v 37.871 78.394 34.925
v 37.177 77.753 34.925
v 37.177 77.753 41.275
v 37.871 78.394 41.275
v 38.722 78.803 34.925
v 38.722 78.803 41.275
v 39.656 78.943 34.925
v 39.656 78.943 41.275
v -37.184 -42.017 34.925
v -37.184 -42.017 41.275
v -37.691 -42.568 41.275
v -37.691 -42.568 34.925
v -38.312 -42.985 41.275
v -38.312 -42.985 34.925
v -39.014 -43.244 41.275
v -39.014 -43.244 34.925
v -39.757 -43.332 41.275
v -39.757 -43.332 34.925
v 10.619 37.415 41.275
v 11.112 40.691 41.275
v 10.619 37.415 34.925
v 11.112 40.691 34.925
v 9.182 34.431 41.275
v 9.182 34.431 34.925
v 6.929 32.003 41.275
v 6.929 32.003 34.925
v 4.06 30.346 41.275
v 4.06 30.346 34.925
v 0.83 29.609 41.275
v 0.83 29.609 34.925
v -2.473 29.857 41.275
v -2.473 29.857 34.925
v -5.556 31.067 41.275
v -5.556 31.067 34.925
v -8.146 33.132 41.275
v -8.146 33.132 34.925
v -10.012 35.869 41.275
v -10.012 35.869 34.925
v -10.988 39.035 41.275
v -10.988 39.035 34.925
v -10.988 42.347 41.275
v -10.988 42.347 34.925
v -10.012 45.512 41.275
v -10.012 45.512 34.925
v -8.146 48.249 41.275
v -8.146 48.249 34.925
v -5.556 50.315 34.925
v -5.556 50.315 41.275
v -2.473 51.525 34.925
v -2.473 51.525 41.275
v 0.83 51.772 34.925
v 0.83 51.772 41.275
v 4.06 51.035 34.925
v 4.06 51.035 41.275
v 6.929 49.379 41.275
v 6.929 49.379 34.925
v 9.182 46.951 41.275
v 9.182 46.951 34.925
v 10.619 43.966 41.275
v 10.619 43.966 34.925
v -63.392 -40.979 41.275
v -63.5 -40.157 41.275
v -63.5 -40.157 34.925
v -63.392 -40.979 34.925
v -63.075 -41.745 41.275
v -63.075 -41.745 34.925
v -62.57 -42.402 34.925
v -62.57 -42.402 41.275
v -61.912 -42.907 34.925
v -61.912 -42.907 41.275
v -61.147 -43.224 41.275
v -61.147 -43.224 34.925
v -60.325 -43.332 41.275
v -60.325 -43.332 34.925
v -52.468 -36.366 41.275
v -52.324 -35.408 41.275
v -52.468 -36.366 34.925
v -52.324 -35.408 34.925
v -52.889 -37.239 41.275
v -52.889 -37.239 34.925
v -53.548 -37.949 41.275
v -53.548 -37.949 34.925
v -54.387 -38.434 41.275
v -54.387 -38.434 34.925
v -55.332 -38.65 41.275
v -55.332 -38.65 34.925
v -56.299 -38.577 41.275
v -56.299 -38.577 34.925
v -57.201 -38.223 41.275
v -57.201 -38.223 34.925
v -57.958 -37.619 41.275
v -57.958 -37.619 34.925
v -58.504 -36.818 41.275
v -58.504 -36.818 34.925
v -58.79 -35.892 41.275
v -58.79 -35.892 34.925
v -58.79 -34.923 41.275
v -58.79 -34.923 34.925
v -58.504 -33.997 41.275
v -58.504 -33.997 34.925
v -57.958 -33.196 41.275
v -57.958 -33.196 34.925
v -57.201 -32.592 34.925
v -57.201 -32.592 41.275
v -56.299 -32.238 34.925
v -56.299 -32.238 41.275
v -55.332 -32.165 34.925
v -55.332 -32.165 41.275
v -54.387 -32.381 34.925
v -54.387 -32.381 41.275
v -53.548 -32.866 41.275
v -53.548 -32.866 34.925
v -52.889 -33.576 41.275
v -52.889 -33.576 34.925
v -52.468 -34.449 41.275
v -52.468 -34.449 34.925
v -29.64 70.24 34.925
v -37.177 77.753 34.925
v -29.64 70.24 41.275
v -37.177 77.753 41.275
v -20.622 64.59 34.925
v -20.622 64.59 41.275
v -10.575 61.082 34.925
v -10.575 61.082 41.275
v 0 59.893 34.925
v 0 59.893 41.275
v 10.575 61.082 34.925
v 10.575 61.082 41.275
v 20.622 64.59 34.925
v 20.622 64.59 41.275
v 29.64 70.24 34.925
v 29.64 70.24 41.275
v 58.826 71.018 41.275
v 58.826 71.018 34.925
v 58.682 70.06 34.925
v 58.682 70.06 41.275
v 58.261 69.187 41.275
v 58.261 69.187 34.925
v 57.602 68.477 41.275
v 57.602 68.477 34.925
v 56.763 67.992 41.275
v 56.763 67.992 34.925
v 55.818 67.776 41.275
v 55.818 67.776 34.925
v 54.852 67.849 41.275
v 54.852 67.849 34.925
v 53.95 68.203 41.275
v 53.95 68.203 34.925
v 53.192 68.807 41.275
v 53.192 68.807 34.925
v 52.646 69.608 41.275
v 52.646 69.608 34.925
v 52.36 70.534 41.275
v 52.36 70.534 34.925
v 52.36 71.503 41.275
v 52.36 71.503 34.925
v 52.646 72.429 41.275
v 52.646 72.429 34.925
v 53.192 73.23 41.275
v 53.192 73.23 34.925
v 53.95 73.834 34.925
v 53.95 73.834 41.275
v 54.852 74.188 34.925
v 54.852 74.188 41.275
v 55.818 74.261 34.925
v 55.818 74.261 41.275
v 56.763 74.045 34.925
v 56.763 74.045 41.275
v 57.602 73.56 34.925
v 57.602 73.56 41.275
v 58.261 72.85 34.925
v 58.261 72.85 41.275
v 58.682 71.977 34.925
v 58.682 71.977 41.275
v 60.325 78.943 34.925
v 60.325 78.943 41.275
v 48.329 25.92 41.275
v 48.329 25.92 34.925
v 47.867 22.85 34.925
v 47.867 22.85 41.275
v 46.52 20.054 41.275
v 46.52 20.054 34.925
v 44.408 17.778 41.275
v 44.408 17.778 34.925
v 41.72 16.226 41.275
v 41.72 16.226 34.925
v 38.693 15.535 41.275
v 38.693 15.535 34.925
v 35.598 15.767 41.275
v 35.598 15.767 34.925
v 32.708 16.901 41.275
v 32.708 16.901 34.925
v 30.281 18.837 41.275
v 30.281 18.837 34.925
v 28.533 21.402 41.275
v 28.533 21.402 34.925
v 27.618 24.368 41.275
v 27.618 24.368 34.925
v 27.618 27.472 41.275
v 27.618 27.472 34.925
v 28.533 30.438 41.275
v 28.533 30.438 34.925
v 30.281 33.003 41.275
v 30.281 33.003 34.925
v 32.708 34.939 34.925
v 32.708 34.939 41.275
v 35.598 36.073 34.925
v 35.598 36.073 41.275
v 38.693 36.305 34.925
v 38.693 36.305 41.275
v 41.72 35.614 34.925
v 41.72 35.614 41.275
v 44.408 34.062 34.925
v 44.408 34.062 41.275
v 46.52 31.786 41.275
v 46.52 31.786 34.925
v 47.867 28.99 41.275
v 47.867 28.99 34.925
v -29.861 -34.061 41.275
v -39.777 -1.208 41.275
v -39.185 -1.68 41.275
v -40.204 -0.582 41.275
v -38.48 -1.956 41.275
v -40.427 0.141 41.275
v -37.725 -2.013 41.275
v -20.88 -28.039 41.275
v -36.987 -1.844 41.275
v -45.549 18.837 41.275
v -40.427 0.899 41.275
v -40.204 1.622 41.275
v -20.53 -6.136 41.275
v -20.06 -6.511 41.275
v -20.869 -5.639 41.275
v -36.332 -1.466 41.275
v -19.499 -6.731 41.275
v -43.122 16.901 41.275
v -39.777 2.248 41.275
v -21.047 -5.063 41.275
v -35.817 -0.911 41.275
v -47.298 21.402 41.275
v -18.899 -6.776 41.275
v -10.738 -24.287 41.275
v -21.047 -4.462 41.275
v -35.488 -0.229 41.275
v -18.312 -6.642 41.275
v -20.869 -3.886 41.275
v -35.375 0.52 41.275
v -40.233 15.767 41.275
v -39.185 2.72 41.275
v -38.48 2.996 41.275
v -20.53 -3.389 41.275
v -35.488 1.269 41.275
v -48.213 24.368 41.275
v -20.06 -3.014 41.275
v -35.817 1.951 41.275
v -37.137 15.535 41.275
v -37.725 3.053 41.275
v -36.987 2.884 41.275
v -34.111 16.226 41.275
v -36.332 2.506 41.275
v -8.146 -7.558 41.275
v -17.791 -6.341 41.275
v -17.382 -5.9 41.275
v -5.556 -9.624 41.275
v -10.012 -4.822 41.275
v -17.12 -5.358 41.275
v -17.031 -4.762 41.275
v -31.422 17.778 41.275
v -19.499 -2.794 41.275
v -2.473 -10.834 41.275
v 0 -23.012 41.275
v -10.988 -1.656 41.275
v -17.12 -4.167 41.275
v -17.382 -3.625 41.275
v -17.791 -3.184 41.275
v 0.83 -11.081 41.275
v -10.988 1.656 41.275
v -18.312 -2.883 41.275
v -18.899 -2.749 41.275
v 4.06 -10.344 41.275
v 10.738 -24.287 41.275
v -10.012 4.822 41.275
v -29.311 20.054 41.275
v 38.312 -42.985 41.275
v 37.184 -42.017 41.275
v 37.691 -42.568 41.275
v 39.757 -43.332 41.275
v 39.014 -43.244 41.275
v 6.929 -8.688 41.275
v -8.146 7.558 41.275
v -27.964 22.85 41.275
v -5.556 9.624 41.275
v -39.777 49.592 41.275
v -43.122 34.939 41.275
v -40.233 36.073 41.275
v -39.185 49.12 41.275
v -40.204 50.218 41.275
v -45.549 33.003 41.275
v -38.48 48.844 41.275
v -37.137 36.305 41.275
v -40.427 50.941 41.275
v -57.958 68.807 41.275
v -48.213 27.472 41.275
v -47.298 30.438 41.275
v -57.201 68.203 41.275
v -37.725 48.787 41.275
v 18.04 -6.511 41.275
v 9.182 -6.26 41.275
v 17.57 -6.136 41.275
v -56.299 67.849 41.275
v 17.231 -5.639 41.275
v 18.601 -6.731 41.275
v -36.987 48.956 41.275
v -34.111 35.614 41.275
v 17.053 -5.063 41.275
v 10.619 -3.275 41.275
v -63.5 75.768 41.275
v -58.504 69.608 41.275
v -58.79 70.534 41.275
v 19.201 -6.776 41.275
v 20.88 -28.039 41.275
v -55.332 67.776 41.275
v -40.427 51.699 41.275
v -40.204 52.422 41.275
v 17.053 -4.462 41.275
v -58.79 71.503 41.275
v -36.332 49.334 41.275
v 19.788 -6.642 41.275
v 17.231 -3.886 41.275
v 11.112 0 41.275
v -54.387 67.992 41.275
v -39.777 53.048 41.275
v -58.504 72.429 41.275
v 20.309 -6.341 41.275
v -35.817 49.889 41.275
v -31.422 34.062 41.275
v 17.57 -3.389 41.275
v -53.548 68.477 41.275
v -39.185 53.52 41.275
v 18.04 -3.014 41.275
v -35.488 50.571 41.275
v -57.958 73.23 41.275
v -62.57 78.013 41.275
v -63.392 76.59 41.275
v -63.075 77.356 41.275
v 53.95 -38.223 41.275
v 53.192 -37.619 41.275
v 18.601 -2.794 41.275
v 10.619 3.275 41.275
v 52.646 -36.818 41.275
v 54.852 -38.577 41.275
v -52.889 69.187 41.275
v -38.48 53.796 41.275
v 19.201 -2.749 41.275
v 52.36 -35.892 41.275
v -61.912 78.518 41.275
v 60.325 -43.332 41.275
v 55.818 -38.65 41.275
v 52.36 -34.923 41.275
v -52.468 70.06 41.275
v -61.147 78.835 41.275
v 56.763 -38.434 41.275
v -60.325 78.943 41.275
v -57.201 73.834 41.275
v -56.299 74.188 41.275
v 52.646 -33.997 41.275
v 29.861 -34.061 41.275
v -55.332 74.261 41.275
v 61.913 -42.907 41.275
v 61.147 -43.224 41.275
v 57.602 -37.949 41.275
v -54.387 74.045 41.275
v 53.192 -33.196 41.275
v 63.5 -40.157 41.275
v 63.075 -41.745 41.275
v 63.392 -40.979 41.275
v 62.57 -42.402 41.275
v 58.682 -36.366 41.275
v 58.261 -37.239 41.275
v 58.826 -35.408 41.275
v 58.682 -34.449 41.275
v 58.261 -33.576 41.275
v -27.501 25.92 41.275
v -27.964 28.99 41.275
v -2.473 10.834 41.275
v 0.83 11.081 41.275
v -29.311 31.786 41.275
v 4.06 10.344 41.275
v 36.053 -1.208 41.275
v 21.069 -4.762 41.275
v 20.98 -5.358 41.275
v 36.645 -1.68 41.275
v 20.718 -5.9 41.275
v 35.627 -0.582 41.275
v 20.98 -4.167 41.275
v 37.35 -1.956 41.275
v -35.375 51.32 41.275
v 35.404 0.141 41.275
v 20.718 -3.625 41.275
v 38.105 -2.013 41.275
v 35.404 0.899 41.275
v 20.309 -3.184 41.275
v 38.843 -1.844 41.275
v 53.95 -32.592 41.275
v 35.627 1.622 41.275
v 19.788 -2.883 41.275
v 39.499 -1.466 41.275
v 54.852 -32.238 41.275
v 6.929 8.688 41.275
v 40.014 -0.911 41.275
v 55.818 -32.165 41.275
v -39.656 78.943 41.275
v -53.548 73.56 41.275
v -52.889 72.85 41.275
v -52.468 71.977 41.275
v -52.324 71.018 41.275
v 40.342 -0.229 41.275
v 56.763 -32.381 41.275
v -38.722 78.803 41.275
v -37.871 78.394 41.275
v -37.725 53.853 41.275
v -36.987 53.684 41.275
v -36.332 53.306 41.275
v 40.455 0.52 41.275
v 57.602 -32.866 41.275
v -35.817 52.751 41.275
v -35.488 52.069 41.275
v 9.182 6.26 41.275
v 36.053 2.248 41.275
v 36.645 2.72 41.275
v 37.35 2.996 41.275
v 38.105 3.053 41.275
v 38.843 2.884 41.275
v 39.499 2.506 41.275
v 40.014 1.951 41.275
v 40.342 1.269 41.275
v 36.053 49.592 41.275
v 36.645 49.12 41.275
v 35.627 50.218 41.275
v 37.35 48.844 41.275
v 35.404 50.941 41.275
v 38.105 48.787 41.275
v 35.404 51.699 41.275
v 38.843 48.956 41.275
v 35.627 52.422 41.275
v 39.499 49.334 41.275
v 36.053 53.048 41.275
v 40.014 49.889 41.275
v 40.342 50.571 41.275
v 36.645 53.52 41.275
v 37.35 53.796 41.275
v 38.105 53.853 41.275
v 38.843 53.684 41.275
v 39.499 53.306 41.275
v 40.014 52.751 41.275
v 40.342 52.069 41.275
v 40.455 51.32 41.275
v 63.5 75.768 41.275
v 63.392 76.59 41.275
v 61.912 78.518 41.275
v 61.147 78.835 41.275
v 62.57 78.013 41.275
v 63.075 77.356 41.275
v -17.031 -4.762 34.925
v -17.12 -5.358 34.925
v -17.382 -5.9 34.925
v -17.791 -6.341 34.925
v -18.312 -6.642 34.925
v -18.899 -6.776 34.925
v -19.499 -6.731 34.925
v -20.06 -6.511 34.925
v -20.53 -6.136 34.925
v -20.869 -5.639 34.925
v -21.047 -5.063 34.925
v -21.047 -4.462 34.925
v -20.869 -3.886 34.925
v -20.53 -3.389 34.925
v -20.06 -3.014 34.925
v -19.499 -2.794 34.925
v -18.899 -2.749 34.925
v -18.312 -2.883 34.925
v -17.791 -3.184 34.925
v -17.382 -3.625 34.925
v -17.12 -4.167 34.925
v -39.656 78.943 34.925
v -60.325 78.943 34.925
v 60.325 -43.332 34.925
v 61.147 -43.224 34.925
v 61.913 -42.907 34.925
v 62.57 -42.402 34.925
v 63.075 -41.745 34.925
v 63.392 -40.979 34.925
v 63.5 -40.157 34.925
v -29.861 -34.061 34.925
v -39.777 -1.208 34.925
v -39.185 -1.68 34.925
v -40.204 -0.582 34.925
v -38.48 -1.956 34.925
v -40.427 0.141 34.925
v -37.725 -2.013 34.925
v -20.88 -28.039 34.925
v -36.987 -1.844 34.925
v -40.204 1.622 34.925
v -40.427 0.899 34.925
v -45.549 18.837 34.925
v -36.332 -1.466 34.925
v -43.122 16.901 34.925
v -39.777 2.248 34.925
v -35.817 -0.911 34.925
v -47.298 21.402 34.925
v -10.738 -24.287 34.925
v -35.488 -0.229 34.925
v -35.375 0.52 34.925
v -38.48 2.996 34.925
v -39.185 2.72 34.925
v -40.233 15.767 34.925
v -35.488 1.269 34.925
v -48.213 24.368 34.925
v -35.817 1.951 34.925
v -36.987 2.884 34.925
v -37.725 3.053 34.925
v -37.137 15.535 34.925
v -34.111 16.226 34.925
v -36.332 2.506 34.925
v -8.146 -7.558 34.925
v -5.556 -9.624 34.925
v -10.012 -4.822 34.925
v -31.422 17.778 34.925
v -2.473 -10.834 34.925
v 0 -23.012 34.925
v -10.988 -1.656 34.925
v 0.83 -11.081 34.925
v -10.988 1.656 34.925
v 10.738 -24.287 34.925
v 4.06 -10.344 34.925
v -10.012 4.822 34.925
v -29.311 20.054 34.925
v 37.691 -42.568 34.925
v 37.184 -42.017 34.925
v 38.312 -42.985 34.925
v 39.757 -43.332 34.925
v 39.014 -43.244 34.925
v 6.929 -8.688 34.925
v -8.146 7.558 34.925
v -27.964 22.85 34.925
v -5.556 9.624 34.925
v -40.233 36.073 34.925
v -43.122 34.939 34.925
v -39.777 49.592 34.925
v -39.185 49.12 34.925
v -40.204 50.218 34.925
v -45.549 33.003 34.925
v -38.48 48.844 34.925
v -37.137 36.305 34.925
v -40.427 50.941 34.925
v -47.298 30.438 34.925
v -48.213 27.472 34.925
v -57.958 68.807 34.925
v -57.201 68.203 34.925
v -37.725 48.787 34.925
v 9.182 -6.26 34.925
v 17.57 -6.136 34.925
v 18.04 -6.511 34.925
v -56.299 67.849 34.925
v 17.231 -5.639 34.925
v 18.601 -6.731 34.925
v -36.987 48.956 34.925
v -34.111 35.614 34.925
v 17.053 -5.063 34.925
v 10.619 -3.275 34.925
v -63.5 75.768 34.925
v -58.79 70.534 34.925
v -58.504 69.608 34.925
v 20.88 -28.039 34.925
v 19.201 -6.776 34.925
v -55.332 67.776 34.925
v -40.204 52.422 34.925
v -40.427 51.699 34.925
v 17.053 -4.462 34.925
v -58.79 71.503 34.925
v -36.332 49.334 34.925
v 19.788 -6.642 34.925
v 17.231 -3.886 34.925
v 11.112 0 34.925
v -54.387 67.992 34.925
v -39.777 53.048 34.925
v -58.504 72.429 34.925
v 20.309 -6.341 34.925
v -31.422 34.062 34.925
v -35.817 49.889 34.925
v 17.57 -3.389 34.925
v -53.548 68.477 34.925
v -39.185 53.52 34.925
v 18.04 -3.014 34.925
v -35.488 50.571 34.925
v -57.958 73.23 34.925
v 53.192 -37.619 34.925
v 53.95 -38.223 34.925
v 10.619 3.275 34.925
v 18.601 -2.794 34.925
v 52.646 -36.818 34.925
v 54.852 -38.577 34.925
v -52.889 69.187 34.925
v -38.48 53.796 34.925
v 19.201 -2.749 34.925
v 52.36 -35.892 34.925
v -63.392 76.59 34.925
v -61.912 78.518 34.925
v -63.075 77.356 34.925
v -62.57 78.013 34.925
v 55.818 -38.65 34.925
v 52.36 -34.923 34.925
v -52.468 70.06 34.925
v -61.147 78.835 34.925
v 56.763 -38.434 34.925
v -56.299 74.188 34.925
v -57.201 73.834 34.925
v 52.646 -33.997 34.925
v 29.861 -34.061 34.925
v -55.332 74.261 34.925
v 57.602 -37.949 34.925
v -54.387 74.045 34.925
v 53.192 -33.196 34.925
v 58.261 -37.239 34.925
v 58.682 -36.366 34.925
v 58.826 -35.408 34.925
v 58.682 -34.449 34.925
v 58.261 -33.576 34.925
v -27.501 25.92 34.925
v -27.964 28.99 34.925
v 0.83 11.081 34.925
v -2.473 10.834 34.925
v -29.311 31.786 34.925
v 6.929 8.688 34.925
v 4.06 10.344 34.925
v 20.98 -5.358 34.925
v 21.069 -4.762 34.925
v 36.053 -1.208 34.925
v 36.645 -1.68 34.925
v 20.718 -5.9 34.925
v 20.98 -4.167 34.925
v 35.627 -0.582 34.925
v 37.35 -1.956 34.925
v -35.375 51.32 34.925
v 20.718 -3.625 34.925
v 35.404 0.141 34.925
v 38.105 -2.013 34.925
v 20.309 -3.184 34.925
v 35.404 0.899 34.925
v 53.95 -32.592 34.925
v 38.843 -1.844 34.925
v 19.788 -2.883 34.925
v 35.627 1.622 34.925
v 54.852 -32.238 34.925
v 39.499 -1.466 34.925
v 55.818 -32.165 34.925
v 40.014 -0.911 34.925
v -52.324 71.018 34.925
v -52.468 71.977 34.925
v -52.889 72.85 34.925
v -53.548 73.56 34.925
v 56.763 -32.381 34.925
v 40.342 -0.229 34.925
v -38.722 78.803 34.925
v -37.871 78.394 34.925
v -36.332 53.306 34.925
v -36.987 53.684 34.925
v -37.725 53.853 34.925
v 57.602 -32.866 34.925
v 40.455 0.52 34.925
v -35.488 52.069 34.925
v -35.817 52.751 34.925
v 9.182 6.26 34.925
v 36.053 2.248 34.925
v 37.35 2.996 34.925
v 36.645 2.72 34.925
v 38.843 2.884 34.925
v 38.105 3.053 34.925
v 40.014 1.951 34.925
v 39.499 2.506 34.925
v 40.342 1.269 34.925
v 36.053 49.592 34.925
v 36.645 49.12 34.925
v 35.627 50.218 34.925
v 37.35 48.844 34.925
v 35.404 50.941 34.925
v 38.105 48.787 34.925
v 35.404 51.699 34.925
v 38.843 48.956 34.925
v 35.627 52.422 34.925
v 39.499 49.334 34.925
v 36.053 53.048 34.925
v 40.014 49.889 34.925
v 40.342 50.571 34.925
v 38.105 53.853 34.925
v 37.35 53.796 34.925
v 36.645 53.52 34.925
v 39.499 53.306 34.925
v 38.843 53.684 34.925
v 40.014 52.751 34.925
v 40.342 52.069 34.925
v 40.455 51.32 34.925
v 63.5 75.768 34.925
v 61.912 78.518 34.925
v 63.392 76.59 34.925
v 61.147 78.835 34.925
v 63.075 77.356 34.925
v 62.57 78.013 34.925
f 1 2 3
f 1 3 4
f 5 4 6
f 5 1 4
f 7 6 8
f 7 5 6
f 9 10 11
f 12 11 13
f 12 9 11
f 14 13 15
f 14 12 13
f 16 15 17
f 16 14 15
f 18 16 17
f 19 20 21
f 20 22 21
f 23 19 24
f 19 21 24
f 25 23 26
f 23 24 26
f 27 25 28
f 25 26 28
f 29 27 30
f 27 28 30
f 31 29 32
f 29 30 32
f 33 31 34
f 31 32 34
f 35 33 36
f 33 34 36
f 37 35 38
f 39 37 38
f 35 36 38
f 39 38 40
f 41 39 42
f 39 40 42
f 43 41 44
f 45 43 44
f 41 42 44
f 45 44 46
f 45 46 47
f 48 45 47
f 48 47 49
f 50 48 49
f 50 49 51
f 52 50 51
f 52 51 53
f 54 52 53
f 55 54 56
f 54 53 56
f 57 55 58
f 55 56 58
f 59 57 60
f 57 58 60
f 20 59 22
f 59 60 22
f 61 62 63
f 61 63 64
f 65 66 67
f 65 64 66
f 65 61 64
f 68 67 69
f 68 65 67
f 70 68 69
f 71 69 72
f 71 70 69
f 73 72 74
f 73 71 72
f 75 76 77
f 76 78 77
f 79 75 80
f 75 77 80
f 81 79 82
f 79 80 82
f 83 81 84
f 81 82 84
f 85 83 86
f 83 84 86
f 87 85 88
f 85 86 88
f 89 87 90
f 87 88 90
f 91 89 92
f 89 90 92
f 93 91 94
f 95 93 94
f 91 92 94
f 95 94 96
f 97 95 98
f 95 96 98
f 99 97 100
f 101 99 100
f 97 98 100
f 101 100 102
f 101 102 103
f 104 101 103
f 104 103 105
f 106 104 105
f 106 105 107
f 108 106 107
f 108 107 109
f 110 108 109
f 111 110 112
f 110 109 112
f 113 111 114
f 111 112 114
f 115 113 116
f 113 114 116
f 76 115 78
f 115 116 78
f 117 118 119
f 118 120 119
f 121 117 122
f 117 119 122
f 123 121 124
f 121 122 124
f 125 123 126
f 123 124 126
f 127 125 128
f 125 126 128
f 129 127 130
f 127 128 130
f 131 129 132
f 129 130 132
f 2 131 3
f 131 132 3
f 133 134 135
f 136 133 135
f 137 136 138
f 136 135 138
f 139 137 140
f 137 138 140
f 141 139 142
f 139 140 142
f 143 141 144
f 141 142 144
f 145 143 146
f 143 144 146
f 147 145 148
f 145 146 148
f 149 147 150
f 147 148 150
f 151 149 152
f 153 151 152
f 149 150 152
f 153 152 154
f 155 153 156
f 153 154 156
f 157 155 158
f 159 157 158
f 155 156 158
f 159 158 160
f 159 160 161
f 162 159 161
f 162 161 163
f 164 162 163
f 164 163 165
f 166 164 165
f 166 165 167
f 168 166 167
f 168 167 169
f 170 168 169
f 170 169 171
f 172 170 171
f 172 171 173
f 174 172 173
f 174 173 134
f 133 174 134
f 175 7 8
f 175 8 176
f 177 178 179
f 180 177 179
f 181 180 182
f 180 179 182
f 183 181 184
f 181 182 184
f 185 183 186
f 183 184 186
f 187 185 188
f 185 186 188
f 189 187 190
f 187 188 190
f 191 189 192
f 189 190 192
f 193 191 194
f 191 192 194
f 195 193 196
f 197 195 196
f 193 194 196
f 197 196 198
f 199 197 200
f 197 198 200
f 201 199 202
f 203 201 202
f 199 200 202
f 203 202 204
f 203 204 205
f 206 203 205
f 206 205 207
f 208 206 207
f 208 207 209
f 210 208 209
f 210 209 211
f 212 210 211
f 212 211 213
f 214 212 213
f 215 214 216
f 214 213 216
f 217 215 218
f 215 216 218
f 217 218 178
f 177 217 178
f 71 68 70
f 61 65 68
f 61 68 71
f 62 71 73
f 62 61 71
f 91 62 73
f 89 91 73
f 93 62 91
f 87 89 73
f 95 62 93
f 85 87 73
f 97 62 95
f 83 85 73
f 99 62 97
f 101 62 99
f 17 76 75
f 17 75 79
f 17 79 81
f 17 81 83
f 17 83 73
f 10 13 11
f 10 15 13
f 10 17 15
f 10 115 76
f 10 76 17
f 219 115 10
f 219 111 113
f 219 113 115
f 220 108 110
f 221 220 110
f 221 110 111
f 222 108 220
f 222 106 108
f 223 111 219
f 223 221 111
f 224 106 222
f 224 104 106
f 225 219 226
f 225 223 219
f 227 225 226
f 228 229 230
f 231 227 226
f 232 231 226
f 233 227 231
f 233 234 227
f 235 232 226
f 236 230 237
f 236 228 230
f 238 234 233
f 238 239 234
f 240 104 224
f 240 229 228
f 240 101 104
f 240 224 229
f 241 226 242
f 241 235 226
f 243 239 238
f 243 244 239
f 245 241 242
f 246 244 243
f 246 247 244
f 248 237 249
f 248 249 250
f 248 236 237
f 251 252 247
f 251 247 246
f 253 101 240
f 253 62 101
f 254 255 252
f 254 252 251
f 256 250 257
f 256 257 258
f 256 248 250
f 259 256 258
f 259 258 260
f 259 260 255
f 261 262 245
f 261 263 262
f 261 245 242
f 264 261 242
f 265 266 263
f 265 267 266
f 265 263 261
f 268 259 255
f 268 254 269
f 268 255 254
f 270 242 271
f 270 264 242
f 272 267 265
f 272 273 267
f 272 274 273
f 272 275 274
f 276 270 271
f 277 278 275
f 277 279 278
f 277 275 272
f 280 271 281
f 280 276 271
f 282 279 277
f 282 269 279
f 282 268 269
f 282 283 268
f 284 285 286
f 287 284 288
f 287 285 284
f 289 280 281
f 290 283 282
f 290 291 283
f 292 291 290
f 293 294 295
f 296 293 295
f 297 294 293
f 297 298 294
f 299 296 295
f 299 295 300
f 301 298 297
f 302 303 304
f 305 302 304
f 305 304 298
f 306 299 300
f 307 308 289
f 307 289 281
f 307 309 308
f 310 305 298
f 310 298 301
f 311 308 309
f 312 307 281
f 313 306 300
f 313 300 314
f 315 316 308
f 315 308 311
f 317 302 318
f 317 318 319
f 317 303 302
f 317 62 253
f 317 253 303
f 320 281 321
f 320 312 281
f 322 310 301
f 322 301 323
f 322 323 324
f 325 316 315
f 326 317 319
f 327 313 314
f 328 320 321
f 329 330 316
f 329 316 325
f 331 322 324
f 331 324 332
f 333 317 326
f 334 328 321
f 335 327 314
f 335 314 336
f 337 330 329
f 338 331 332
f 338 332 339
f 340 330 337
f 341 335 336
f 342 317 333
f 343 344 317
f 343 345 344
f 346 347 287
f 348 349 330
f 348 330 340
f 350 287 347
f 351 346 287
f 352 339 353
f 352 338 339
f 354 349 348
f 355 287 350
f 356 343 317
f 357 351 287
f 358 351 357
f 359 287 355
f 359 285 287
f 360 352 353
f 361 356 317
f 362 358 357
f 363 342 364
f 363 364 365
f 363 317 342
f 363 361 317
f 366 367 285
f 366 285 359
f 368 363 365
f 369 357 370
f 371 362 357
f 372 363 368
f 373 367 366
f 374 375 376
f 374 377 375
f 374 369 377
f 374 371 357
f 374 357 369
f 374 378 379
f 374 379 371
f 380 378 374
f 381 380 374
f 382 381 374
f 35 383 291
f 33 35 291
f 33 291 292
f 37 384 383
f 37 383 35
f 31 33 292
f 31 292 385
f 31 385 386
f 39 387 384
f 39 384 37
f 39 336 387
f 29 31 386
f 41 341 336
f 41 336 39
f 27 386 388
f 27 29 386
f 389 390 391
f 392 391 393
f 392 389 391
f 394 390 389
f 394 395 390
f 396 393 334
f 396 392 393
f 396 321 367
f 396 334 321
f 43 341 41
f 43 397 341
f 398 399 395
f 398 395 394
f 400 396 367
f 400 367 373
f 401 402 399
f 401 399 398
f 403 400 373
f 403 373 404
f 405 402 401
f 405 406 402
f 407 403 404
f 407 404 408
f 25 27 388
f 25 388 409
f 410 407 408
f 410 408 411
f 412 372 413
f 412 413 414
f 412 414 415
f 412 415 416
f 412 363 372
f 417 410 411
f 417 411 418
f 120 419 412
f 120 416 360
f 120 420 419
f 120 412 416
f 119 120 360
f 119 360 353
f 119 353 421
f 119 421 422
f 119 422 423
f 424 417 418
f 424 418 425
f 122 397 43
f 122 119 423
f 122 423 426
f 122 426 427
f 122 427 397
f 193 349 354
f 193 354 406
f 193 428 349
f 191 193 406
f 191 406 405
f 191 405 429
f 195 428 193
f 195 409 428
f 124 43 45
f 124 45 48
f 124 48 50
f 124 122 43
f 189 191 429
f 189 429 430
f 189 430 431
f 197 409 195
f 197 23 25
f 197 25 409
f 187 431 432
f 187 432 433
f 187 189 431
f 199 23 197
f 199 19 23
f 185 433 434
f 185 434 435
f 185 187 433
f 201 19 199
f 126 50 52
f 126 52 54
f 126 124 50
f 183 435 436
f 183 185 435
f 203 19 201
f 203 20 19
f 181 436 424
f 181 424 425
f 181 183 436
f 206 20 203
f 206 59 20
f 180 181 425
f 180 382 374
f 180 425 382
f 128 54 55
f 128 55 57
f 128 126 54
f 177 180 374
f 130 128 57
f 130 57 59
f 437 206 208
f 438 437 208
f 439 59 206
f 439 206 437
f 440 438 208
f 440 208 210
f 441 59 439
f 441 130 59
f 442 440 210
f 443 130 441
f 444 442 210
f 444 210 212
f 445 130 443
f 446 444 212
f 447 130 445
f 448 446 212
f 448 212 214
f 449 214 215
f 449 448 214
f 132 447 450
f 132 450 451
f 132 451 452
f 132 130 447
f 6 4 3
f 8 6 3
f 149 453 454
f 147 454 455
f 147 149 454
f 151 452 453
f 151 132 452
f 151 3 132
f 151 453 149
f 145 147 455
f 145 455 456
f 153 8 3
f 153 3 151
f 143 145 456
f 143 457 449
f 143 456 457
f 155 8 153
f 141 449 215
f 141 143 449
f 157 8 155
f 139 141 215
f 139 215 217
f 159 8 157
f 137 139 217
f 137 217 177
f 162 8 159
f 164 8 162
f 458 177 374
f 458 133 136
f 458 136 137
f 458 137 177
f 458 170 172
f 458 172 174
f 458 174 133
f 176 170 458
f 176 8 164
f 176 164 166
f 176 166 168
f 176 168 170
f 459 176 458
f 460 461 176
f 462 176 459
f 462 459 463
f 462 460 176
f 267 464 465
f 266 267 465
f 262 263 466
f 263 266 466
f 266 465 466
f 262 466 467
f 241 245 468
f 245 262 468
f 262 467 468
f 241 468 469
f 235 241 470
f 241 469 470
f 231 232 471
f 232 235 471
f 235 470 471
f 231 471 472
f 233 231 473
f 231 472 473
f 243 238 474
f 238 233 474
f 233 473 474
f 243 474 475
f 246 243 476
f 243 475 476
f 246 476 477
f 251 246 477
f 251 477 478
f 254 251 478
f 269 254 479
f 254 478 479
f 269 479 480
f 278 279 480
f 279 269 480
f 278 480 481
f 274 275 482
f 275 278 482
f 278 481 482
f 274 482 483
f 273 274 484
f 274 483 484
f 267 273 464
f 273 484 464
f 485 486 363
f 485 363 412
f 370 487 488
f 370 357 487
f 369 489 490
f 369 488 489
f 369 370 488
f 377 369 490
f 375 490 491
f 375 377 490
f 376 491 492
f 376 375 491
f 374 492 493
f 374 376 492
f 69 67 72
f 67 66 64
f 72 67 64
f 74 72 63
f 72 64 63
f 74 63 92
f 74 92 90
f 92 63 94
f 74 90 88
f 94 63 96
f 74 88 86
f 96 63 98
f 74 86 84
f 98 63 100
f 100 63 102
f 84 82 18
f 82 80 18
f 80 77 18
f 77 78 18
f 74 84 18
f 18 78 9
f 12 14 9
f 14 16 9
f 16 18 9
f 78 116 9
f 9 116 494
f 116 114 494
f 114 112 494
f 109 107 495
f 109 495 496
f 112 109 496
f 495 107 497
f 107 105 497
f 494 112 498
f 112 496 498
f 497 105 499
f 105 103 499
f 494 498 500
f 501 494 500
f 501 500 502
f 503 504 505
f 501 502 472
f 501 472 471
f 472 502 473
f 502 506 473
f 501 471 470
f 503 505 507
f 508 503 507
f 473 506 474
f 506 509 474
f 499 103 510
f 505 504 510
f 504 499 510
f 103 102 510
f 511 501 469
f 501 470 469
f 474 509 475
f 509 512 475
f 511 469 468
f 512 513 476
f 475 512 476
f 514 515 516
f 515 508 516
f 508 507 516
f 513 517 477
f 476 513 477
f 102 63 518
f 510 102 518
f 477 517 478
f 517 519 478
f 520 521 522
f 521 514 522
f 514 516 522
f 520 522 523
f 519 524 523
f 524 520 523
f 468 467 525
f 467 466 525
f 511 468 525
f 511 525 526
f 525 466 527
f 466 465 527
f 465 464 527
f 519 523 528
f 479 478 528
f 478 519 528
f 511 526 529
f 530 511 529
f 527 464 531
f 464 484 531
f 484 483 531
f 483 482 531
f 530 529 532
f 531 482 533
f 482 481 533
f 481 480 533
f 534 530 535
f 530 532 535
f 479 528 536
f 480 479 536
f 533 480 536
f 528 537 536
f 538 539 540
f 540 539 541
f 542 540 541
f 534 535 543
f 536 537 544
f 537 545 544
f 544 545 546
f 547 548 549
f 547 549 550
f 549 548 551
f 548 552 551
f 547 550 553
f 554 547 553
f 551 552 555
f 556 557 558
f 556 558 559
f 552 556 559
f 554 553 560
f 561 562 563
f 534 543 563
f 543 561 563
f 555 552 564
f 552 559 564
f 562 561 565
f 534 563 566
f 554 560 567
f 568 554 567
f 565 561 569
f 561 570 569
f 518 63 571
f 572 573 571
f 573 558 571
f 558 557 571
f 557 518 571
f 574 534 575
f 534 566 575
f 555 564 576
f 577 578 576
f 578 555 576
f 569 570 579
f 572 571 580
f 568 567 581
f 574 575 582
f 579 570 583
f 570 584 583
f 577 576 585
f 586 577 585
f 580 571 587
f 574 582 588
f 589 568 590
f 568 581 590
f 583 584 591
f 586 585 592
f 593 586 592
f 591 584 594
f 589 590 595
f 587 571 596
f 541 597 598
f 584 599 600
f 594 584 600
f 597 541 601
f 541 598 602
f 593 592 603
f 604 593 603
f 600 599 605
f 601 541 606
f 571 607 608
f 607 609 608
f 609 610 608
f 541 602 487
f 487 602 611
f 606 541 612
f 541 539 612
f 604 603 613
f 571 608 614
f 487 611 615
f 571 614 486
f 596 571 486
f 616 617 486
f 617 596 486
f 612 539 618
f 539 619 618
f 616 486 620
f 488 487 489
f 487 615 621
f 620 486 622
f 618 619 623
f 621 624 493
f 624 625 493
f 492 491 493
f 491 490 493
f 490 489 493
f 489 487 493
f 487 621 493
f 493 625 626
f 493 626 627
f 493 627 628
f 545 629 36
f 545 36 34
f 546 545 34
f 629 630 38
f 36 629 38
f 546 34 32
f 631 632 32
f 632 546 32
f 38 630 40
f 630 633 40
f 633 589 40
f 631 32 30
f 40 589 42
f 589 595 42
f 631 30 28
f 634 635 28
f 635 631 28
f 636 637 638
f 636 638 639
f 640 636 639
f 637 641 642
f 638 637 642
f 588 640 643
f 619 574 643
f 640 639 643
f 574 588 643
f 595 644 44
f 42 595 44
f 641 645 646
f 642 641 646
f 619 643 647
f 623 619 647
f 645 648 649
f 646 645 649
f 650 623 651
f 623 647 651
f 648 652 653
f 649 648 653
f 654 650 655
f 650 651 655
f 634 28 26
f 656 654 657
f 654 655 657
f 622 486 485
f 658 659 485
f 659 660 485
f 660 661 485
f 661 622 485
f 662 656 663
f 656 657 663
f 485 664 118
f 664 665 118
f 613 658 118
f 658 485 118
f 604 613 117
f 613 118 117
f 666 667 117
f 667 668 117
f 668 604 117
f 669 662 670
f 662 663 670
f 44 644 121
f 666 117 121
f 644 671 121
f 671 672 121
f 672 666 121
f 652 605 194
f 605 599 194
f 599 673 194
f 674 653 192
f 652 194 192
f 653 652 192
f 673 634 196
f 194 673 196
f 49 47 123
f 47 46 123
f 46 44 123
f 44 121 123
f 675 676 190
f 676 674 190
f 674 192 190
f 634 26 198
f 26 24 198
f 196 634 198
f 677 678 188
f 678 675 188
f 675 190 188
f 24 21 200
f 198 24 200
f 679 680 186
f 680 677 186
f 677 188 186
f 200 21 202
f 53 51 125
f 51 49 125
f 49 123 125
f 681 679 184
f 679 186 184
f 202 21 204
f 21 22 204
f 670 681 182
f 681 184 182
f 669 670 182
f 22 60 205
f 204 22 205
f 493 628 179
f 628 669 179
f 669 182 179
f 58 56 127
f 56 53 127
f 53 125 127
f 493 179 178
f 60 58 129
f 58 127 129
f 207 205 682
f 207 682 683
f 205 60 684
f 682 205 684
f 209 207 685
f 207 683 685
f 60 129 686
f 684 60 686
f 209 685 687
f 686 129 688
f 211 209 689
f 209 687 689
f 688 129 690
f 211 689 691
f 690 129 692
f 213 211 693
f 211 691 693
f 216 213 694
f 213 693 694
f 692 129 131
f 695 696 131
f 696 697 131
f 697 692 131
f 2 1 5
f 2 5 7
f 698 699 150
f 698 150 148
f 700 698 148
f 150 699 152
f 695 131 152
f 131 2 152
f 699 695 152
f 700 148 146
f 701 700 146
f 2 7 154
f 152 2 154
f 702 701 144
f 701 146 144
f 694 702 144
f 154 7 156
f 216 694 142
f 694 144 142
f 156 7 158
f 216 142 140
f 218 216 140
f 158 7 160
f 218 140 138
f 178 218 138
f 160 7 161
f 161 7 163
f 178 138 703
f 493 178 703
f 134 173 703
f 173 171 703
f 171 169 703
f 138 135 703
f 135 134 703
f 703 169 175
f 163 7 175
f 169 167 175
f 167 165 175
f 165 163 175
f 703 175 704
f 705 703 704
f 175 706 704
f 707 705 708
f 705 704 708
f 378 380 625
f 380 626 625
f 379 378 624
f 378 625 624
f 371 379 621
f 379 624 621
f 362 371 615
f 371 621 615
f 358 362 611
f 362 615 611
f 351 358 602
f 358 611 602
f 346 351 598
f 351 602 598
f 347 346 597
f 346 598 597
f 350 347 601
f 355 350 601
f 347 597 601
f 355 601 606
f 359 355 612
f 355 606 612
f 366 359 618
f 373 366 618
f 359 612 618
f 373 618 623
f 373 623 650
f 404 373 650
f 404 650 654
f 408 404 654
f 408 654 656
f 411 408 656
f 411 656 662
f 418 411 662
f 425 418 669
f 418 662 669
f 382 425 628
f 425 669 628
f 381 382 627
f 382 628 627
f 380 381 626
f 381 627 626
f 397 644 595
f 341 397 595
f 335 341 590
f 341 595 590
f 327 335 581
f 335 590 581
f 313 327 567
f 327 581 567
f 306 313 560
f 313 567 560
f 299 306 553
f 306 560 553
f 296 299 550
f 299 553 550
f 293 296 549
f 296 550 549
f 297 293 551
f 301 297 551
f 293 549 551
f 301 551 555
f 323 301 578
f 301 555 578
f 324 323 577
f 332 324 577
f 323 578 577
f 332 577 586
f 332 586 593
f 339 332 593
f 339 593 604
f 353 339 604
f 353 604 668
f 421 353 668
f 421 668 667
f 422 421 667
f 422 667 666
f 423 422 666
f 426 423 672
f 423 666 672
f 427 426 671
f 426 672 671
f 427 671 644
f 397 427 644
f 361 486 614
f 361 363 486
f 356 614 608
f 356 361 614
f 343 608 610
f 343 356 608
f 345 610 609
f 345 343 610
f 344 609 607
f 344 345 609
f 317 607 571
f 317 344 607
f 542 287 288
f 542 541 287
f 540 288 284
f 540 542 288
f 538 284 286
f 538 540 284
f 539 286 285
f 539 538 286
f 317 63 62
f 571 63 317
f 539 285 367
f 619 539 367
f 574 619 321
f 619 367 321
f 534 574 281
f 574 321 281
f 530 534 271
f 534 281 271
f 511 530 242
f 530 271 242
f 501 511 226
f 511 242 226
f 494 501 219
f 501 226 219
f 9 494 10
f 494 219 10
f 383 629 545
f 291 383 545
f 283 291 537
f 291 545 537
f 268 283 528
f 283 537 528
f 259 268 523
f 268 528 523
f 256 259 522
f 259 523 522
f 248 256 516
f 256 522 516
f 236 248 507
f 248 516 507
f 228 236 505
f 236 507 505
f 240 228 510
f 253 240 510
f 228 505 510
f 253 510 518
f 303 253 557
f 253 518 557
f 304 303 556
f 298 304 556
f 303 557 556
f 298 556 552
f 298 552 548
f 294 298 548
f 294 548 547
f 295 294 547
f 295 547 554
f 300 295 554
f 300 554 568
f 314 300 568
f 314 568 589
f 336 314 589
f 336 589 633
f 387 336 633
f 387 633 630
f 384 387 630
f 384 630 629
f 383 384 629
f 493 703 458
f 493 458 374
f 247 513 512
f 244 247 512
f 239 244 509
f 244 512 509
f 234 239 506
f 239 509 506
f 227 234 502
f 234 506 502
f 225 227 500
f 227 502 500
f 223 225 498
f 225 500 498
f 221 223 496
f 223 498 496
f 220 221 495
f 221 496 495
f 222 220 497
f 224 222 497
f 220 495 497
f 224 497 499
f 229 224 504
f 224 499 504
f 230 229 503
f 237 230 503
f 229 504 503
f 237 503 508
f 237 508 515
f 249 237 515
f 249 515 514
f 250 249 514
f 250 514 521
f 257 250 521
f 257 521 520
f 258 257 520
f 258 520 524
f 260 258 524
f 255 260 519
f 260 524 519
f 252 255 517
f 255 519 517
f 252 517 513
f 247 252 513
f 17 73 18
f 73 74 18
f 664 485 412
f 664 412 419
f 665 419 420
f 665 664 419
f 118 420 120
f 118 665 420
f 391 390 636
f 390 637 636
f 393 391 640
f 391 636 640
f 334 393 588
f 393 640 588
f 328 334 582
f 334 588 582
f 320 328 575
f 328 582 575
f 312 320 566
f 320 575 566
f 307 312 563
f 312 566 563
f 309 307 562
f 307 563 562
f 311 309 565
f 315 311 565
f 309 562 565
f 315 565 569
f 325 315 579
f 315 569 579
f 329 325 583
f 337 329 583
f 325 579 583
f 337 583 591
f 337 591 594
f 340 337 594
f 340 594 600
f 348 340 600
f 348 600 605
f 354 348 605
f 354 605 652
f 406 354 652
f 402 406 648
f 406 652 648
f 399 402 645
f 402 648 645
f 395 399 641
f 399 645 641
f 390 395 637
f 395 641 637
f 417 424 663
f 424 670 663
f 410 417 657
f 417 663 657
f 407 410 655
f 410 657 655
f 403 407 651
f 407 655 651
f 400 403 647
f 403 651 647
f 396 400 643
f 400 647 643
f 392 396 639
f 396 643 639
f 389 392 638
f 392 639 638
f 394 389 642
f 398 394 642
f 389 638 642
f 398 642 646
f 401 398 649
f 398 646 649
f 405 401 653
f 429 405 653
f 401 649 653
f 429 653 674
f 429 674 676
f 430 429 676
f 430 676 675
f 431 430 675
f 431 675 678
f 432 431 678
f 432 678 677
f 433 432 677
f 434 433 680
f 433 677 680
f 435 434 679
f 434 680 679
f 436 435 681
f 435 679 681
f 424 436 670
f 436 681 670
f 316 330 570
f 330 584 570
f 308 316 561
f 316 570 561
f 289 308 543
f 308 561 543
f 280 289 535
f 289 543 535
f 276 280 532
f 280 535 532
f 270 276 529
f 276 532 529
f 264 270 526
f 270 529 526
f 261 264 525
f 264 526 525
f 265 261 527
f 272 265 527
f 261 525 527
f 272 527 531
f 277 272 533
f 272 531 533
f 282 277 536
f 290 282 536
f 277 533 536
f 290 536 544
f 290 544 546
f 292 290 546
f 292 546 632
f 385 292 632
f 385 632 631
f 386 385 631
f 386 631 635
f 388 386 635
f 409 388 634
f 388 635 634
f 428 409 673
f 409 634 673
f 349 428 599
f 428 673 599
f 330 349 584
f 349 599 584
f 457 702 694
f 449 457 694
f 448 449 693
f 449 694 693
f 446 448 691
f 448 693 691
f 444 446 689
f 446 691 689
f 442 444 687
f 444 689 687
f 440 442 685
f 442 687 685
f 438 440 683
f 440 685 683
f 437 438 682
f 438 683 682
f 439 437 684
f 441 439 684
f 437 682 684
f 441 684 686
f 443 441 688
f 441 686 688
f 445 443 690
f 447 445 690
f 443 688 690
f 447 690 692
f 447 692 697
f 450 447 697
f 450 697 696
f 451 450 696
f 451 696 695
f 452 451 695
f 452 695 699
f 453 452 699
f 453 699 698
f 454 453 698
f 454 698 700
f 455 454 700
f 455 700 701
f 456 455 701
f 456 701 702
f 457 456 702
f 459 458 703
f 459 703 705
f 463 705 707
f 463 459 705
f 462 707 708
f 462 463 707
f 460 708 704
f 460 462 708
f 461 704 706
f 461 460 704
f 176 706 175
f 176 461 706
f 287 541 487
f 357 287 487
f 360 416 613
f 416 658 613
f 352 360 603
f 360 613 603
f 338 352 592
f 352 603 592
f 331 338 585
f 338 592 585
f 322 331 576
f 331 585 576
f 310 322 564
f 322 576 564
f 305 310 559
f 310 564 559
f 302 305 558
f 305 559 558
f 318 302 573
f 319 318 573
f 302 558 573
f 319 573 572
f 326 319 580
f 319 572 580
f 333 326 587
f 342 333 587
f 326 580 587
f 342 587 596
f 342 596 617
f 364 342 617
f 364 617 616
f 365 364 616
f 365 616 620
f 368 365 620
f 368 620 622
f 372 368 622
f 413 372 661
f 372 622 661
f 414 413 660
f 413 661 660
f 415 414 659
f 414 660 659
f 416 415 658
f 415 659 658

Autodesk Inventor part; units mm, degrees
ref_plane "YZ Plane" through (0, 0, 0) normal (1, 0, 0) x (0, 1, 0)
ref_plane "XZ Plane" through (0, 0, 0) normal (0, 1, 0) x (-1, 0, 0)
ref_plane "XY Plane" through (0, 0, 0) normal (0, 0, 1) x (1, 0, 0)
ref_plane "Work Plane1" through (-63.5, 101.6, 34.925) normal (0, 0, 1) x (1, 0, 0)
sketch "Sketch2" plane through (-63.5, 101.6, 34.925) normal (0, 0, 1) x (1, 0, 0)
  circle A0 centre (63.5, -101.6) radius 11.1125
  circle A1 centre (44.45, -106.3625) radius 2.0193 projected
  circle A2 centre (44.45, -106.3625) radius 2.0193
  circle A3 centre (25.5848, -101.08) radius 2.54 projected
  circle A4 centre (25.5848, -101.08) radius 2.54
  line L0 (44.45, -106.3625) -> (82.55, -106.3625)
  circle A5 centre (82.55, -106.3625) radius 2.0193
  circle A6 centre (101.4152, -101.08) radius 2.54 projected
  line L1 (25.5848, -101.08) -> (101.4152, -101.08)
  circle A7 centre (101.4152, -101.08) radius 2.54
  line L2 (25.5848, -101.08) -> (25.5848, -75.68)
  line L3 (101.4152, -101.08) -> (101.4152, -75.68)
  circle A8 centre (25.5848, -75.68) radius 10.414
  circle A9 centre (101.4152, -75.68) radius 10.414
  circle A10 centre (63.5, -60.9092) radius 11.1125 projected
  line L4 (63.5, -60.9092) -> (63.5, -101.6)
  circle A11 centre (63.5, -60.9092) radius 11.1125
  circle A12 centre (25.5848, -50.28) radius 2.54 projected
  line L5 (25.5848, -50.28) -> (25.5848, -75.68)
  line L6 (101.4152, -75.68) -> (101.4152, -50.28)
  circle A13 centre (25.5848, -50.28) radius 2.54
  circle A14 centre (101.4152, -50.28) radius 2.54
  circle A15 centre (63.5, -101.6) radius 11.1125 projected
  line L7 (127, 0) -> (127, -139.7) projected
  line L8 (0, -139.7) -> (0, 0) projected
  line L9 (0, -144.9324) -> (127, -144.9324)
  line L10 (0, -144.9324) -> (7.9248, -144.9324)
  line L11 (7.9248, -144.9324) -> (7.9248, -137.0076)
  circle A16 centre (7.9248, -137.0076) radius 3.2512
  line L12 (127, -144.9324) -> (119.0752, -144.9324)
  line L13 (119.0752, -144.9324) -> (119.0752, -137.0076)
  circle A17 centre (119.0752, -137.0076) radius 3.2512
  line L14 (0, 0) -> (127, 0) projected
  line L15 (0, -22.6568) -> (127, -22.6568)
  line L16 (0, -22.6568) -> (7.9248, -22.6568)
  line L17 (7.9248, -22.6568) -> (7.9248, -30.5816)
  line L18 (127, -22.6568) -> (119.0752, -22.6568)
  line L19 (119.0752, -22.6568) -> (119.0752, -30.5816)
  circle A18 centre (7.9248, -30.5816) radius 3.2512
  circle A19 centre (119.0752, -30.5816) radius 3.2512
  line L20 (63.5, 0) -> (63.5, -17.78)
  line L21 (0, -144.9324) -> (0, -22.6568)
  line L22 (127, -144.9324) -> (127, -22.6568)
  line L23 (63.5, -101.6) -> (63.5, -106.3625)
  line L24 (63.5, -106.3625) -> (82.55, -106.3625)
  line L25 (82.55, -106.3625) -> (44.45, -106.3625)
  dimension "d0" = 38.1
  dimension "d1" = 25.4
  dimension "d23" = 7.9248
  dimension "d24" = 7.9248
  dimension "d25" = 17.78
  dimension "d27" = 38.2524
  dimension "d29" = 7.9248
  dimension "d30" = 7.9248
  dimension "d31" = 43.3324
extrude "Extrusion1" add sketch "Sketch2" along normal blind 6.35 contours L7 L22 L9 L21 L8 L15
fillet "Fillet1" radius 3.175 4 edges at (-63.5, 78.9432, 38.1) (-63.5, -43.3324, 38.1) (63.5, 78.9432, 38.1) (63.5, -43.3324, 38.1)
sketch "Sketch5" plane through (-63.5, 101.6, 41.275) normal (0, 0, 1) x (1, 0, 0)
  line L0 (3.175, -144.9324) -> (123.825, -144.9324) projected
  line L1 (63.5, -144.9324) -> (25.4, -144.9324)
  line L2 (25.4, -144.9324) -> (101.6, -144.9324)
  line L3 (63.5, -144.9324) -> (63.5, -124.6124)
  arc A0 (101.6, -144.9324) -> (25.4, -144.9324) centre (63.5, -170.4912) ccw
  line L4 (123.825, -22.6568) -> (3.175, -22.6568) projected
  line L5 (25.4, -22.6568) -> (101.6, -22.6568)
  line L6 (63.5, -22.6568) -> (63.5, -41.7068)
  arc A1 (25.4, -22.6568) -> (101.6, -22.6568) centre (63.5, 5.9182) ccw
  line L7 (25.4, -144.9324) -> (101.6, -144.9324)
  arc A2 (101.6, -144.9324) -> (25.4, -144.9324) centre (63.5, -170.4912) ccw
  point P0 (63.5, -101.6)
  dimension "d16" = 38.1
  dimension "d17" = 76.2
  dimension "d18" = 20.32
  dimension "d19" = 19.05
extrude "Extrusion2" cut sketch "Sketch5" against normal blind 25.4
fillet "Fillet2" radius 3.175 4 edges at (-38.1, 78.9432, 38.1) (38.1, 78.9432, 38.1) (38.1, -43.3324, 38.1) (-38.1, -43.3324, 38.1)
properties part number "am-2725+3CIM4U+Motor+Plate+r2" material "Aluminum 6061"
